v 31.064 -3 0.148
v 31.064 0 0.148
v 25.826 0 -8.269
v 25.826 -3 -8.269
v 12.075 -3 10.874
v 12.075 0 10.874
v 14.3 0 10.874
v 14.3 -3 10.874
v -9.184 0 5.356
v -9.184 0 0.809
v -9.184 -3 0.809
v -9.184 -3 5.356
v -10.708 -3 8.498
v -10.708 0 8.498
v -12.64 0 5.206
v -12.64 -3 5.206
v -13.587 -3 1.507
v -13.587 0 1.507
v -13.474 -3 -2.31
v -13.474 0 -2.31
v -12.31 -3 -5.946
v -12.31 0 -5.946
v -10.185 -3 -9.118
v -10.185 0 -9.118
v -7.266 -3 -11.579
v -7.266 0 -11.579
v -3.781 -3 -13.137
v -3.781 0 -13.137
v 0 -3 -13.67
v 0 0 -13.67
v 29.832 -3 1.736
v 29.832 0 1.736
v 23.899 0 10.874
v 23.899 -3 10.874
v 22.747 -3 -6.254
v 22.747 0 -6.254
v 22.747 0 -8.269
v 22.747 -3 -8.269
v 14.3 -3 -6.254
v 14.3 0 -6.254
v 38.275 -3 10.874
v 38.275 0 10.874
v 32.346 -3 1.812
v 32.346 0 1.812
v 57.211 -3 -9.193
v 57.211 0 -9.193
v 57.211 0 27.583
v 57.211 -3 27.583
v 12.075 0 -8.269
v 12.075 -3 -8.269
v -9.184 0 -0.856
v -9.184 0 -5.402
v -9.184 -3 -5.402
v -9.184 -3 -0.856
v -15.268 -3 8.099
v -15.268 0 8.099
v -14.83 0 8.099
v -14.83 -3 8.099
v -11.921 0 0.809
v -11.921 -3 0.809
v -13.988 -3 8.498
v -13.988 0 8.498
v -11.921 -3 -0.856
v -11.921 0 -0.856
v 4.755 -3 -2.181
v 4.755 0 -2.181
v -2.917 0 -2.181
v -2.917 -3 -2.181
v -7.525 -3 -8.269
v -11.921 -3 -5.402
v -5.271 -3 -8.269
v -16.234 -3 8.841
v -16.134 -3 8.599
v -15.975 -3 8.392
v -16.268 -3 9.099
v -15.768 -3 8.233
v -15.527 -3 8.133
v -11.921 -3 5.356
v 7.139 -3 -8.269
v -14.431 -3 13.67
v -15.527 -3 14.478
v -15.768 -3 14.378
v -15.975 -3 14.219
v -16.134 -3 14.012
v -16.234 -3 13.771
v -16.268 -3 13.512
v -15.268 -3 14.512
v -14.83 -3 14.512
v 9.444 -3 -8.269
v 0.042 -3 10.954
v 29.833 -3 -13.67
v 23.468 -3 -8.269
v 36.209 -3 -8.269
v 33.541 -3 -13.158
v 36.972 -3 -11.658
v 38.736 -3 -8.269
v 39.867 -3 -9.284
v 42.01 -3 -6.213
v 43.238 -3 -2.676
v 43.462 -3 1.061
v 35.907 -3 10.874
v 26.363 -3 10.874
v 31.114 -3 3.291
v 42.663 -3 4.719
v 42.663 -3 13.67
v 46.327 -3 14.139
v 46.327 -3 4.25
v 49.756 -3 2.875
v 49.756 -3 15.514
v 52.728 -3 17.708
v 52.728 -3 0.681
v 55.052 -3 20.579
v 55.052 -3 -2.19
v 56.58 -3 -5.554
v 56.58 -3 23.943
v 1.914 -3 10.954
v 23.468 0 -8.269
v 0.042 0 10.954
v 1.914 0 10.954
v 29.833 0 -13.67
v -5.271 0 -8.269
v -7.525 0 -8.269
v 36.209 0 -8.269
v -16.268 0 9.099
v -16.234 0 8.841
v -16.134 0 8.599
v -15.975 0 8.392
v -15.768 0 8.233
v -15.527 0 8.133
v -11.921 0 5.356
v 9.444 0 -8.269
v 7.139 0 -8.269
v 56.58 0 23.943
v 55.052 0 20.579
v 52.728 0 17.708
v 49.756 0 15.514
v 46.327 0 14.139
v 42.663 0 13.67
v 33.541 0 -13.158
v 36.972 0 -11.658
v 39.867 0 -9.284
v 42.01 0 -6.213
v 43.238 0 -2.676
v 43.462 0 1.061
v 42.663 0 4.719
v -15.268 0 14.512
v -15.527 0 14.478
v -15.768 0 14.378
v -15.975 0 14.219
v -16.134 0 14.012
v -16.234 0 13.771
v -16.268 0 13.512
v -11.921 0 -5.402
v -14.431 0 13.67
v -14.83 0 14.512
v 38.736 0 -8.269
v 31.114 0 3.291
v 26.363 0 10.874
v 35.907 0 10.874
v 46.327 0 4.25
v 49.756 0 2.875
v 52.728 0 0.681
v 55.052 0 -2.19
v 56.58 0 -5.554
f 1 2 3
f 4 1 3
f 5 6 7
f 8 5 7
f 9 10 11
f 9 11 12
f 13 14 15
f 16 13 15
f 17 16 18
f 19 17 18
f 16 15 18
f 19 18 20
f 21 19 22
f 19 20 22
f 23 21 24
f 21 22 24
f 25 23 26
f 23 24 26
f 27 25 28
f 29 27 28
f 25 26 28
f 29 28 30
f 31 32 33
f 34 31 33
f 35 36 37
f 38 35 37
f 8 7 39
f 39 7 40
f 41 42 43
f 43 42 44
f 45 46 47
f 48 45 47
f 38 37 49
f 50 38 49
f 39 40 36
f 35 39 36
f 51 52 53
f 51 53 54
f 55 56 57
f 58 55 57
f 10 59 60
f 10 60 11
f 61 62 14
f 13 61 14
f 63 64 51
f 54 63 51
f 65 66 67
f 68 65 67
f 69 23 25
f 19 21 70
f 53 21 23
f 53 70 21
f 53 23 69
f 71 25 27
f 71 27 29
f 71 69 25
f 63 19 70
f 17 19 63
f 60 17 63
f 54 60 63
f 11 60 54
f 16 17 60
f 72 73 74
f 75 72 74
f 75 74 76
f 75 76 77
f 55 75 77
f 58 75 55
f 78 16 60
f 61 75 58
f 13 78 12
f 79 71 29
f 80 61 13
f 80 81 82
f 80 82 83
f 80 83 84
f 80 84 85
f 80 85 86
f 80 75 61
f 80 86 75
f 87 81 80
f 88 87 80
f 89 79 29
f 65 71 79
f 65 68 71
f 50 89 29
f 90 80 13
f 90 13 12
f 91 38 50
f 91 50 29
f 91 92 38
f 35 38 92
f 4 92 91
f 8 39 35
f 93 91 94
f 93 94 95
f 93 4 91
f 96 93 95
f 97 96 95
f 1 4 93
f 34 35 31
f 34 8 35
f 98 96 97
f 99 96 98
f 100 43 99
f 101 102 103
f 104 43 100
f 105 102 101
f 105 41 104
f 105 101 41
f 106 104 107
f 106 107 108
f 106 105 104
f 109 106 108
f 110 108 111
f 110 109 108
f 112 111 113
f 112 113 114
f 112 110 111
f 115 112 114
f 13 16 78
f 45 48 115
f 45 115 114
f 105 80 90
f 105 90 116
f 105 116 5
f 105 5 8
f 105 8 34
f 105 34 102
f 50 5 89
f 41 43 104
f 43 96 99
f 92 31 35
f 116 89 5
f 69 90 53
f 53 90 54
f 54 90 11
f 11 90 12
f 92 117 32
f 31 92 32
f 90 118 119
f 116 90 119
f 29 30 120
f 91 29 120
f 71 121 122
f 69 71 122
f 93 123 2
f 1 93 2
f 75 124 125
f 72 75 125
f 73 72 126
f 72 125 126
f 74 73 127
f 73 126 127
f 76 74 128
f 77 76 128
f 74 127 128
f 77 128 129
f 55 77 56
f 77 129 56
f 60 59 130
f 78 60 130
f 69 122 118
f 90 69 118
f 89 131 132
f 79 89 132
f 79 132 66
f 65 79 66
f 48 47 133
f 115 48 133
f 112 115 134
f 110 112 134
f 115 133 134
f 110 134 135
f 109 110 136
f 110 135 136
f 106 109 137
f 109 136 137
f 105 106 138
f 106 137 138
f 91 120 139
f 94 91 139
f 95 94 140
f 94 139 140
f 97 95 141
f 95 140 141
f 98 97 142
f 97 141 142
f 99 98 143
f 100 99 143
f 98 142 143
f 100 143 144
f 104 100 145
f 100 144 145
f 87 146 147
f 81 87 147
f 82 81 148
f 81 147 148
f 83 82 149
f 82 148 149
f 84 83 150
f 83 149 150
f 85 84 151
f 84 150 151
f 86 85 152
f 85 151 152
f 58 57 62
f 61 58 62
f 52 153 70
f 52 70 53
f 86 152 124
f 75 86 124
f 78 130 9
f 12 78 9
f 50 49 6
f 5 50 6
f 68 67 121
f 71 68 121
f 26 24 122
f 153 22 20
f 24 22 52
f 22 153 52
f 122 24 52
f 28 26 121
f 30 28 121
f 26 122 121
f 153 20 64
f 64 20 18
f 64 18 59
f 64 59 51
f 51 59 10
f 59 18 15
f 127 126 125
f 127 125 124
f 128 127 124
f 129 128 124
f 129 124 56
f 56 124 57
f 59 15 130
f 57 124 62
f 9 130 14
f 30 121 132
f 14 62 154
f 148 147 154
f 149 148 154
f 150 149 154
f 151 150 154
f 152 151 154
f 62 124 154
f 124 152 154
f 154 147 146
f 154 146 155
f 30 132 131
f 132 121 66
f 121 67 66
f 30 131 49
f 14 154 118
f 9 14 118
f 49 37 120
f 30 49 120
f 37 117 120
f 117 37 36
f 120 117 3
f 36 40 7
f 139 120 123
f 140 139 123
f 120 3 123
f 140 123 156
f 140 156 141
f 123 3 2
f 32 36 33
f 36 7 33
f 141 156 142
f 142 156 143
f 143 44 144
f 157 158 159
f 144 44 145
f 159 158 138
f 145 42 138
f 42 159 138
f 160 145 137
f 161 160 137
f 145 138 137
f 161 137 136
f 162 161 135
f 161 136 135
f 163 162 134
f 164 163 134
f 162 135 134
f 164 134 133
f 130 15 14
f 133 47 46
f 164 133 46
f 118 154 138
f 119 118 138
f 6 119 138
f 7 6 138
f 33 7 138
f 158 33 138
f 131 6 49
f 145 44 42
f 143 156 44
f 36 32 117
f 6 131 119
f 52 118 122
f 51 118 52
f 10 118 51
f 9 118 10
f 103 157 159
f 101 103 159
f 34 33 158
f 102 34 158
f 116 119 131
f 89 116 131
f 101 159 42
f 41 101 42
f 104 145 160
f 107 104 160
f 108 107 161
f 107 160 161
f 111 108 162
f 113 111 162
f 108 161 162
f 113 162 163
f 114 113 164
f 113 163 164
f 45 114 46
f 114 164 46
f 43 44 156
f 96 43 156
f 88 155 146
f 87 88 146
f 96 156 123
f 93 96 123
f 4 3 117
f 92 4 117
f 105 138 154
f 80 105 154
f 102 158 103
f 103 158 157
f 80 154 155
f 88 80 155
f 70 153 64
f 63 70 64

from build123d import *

# Parameters (mm, degrees)
F0_W     = 2.7374038473
F0_H     = 4.5464726281
F1_DEPTH = 3


with BuildPart() as f1:
    # F0 (on Front) → F1 (new body)
    with BuildSketch(Plane.XZ):
        with BuildLine():
            Line((-13.9879264009, 8.4983842463), (-10.7078288449, 8.4983842463))
            ThreePointArc((-10.7078288449, 8.4983842463), (-12.3096819162, -5.9457433928), (0, -13.6704108706))
            Line((0, -13.6704108706), (29.832560569, -13.6704108706))
            ThreePointArc((29.832560569, -13.6704108706), (41.0439649972, -7.8220549805), (42.6626390029, 4.7190275219))
            ThreePointArc((42.6626390029, 4.7190275219), (52.7277631814, 0.6811115523), (57.2114773095, -9.193492122))
            Line((57.2114773095, -9.193492122), (57.2114773095, 27.5829305145))
            ThreePointArc((57.2114773095, 27.5829305145), (52.7277631814, 17.7083268402), (42.6626390029, 13.6704108706))
            Line((42.6626390029, 13.6704108706), (29.832560569, 13.6704108706))
            Line((29.832560569, 13.6704108706), (0, 13.6704108706))
            Line((0, 13.6704108706), (-14.4307379611, 13.6704108706))
            Line((-14.4307379611, 13.6704108706), (-14.8297163701, 14.5122008398))
            Line((-14.8297163701, 14.5122008398), (-15.268201828, 14.5122008398))
            ThreePointArc((-15.268201828, 14.5122008398), (-15.9753086092, 14.219307621), (-16.268201828, 13.5122008398))
            Line((-16.268201828, 13.5122008398), (-16.268201828, 9.0994058373))
            ThreePointArc((-16.268201828, 9.0994058373), (-15.9753086092, 8.3922990562), (-15.268201828, 8.0994058373))
            Line((-15.268201828, 8.0994058373), (-14.8297163701, 8.0994058373))
            Line((-14.8297163701, 8.0994058373), (-13.9879264009, 8.4983842463))
        make_face()
        with Locations((-10.5523099191, -3.12910098)):
            Rectangle(F0_W, F0_H, mode=Mode.SUBTRACT)
        Polygon((9.4438036352, -8.2694776356), (7.1393343615, -8.2694776356), (4.7552561492, -2.1814888088), (-2.9165315603, -2.1814888088), (-5.2712801637, -8.2694776356), (-7.5254701078, -8.2694776356), (0.0415689984, 10.9539860515), (1.9144740263, 10.9539860515), align=None, mode=Mode.SUBTRACT)
        with Locations((-10.5523099191, 3.0826488801)):
            Rectangle(F0_W, F0_H, mode=Mode.SUBTRACT)
        Polygon((22.7468762609, -8.2694776356), (12.0750885514, -8.2694776356), (12.0750885514, 10.874377113), (14.2999488866, 10.874377113), (14.2999488866, -6.2541145071), (22.7468762609, -6.2541145071), align=None, mode=Mode.SUBTRACT)
        Polygon((32.3460382721, 1.811527951), (38.7357030766, -8.2694776356), (36.2091667637, -8.2694776356), (31.0639153671, 0.1481201297), (25.8264851995, -8.2694776356), (23.467546652, -8.2694776356), (29.8320717916, 1.7361089566), (23.8991108978, 10.874377113), (26.3627980486, 10.874377113), (31.1141946967, 3.2905782303), (35.9074907861, 10.874377113), (38.2748092218, 10.874377113), align=None, mode=Mode.SUBTRACT)
    extrude(amount=F1_DEPTH)


solid = f1.part
